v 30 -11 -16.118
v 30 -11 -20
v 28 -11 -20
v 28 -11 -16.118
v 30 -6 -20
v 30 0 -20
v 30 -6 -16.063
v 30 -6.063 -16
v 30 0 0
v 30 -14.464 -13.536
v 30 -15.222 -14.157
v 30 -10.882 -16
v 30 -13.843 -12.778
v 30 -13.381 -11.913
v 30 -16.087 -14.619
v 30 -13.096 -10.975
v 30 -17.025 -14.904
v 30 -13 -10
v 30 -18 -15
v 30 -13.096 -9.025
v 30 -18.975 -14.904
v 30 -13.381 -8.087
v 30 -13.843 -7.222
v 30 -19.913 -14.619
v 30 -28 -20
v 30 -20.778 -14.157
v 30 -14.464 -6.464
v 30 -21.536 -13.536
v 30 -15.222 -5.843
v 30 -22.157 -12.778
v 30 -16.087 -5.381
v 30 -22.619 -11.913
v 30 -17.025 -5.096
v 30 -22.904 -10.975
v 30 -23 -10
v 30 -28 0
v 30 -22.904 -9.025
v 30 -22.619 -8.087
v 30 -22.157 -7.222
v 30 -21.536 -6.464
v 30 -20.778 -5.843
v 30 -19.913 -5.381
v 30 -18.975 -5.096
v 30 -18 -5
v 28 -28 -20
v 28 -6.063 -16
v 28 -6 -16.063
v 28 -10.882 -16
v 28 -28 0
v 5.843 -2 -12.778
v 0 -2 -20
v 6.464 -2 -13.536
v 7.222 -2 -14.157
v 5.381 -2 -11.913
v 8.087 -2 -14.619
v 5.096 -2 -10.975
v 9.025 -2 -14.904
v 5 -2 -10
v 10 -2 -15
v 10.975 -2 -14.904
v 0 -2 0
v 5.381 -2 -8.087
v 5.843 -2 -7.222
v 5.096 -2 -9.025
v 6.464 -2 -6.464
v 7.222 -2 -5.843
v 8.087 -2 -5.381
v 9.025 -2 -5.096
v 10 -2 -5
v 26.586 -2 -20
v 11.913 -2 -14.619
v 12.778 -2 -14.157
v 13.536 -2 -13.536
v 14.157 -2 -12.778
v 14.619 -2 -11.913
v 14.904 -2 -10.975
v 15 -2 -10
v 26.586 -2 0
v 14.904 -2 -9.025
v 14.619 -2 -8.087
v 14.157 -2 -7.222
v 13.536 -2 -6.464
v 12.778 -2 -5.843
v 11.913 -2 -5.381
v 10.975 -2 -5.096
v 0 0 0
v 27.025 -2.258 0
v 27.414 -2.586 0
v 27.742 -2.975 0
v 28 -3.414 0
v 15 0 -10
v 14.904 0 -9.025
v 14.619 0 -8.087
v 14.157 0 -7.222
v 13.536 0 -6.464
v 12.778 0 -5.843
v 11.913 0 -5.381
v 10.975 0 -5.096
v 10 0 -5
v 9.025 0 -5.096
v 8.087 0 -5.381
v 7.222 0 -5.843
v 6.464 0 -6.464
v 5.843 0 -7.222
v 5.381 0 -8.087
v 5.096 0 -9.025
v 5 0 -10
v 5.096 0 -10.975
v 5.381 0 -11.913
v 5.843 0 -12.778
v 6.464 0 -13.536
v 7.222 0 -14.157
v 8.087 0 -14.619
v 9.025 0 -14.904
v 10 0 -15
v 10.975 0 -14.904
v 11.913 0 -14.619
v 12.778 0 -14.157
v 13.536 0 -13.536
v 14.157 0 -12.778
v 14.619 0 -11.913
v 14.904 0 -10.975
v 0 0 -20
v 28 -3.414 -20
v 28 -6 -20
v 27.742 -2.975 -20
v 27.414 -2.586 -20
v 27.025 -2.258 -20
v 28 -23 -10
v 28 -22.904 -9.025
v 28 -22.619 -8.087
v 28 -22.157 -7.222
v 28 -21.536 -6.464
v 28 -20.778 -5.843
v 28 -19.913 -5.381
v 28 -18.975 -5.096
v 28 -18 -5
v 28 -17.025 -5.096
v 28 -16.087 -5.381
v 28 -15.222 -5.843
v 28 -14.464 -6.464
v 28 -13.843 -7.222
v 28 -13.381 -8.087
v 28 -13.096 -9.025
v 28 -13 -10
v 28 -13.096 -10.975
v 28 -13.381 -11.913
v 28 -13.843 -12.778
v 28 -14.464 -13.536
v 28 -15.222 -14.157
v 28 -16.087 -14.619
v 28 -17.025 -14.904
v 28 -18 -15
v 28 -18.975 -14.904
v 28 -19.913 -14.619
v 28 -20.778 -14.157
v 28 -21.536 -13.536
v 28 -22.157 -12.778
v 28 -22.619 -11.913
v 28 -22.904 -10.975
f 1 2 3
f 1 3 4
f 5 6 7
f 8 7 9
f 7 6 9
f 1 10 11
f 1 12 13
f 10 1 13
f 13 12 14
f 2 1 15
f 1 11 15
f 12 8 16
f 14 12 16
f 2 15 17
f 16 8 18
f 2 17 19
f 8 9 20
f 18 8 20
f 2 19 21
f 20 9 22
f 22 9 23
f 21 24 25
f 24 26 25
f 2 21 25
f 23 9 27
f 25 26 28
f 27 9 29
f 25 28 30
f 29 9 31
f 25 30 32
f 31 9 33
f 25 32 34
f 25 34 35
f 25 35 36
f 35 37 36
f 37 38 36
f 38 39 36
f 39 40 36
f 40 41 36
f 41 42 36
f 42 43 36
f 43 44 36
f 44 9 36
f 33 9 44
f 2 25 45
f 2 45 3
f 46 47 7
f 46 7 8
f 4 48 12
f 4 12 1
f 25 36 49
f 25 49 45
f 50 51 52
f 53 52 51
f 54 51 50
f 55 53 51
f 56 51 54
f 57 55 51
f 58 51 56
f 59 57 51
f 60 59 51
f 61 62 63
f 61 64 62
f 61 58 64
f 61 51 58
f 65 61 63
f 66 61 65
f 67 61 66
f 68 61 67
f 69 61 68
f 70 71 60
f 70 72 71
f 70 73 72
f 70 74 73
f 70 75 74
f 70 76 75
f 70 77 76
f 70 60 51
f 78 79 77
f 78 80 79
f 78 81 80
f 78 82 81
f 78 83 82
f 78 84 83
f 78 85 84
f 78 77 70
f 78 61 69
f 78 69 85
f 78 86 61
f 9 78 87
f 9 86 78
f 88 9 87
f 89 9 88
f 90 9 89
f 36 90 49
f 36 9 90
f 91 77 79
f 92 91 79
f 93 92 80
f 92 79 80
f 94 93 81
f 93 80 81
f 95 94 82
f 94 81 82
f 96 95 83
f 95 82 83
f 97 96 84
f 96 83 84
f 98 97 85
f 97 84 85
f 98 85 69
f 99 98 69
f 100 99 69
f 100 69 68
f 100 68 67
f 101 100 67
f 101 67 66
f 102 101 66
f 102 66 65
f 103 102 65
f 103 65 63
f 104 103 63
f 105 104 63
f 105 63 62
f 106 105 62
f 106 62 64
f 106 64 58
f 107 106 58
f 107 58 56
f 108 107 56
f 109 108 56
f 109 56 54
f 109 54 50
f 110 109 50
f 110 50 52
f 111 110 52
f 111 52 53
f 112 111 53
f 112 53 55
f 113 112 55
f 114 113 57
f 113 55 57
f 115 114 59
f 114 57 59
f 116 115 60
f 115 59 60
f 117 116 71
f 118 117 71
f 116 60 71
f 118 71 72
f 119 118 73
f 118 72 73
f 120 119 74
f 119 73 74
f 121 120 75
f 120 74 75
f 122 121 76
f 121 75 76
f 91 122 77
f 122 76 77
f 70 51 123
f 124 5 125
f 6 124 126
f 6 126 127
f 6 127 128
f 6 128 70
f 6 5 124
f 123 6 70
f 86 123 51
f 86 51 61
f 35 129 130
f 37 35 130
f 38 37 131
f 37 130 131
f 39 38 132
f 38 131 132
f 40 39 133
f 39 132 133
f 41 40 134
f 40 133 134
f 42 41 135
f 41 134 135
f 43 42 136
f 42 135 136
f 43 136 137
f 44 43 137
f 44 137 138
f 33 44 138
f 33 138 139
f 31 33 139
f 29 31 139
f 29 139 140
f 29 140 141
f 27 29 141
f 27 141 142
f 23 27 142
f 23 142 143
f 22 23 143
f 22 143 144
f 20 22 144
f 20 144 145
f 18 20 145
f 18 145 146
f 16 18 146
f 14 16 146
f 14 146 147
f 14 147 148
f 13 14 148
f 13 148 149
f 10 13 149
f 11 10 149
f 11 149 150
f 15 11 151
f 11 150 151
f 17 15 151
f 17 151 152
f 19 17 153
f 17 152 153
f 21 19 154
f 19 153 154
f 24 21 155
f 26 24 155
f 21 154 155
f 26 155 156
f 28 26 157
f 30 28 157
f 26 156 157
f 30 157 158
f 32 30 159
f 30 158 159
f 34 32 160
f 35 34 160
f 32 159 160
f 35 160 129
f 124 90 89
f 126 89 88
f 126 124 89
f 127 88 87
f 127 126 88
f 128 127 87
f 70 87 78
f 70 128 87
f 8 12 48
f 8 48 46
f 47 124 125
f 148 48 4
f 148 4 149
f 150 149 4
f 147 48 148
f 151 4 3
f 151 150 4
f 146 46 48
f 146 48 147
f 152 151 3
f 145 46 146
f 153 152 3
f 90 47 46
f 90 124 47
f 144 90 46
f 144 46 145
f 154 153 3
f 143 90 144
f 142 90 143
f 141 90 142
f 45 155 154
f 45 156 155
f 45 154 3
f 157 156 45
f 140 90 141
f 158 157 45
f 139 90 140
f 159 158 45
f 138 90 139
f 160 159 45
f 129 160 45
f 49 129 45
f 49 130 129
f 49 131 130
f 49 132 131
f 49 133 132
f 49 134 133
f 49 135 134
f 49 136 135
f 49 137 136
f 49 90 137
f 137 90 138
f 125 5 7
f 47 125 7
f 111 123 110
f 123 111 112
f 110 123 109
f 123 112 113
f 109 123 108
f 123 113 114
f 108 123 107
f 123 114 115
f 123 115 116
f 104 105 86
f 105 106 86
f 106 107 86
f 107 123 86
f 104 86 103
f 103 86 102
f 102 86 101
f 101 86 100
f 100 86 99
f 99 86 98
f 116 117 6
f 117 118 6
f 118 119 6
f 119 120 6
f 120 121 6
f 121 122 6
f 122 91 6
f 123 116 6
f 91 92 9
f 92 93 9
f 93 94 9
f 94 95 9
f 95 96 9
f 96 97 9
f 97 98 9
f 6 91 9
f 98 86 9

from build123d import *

# Parameters (mm, degrees)
F0_W      = 30
F0_H      = 20
F1_DEPTH  = 2
F2_R      = 5
F3_DEPTH  = 25
F4_W      = 5
F4_H      = 4
F5_DEPTH  = 2
F6_W      = 5
F6_H      = 4
F7_DEPTH  = 25
F8_R      = 5
F9_DEPTH  = 25
F11_DEPTH = 20
F13_DEPTH = 2
F15_DEPTH = 2


with BuildPart() as f1:
    # F0 (on Front) → F1 (new body)
    with BuildSketch(Plane.XZ):
        with Locations((15, -10)):
            Rectangle(F0_W, F0_H)
    extrude(amount=F1_DEPTH)

    # F2 (on face) → F3 (cut)
    with BuildSketch(Plane.XZ.offset(2)):
        with Locations((10, -10)):
            Circle(F2_R)
    extrude(amount=-F3_DEPTH, mode=Mode.SUBTRACT)

    # F4 (on face) → F5 (join)
    with BuildSketch(Plane.YZ.offset(30)):
        Polygon((-3, -20), (-2, -20), (-2, 0), (-28, 0), (-28, -20), (-8, -20), (-8, -16), (-3, -16), align=None)
        with Locations((-5.5, -18)):
            Rectangle(F4_W, F4_H)
    extrude(amount=-F5_DEPTH)

    # F6 (on face) → F7 (cut)
    with BuildSketch(Plane.YZ.offset(30)):
        with Locations((-8.5, -18)):
            Rectangle(F6_W, F6_H)
    extrude(amount=-F7_DEPTH, mode=Mode.SUBTRACT)

    # F8 (on face) → F9 (cut)
    with BuildSketch(Plane(origin=(28, 0, 0), x_dir=(0, -1, 0), z_dir=(-1, 0, 0))):
        with Locations((18, -10)):
            Circle(F8_R)
    extrude(amount=-F9_DEPTH, mode=Mode.SUBTRACT)

    # F10 (on face) → F11 (join)
    with BuildSketch(Plane(origin=(0, 0, -20), x_dir=(1, 0, 0), z_dir=(0, 0, -1))):
        with BuildLine():
            ThreePointArc((28, 6), (27.414214, 2.585786), (24, 2))
            Line((24, 2), (24, 0))
            Line((24, 0), (30, 0))
            Line((30, 0), (30, 6))
            Line((30, 6), (28, 6))
        make_face()
    extrude(amount=-F11_DEPTH)

    # F12 (on face) → F13 (join)
    with BuildSketch(Plane(origin=(28, 0, 0), x_dir=(0, -1, 0), z_dir=(-1, 0, 0))):
        Polygon((11, -16), (10.881885, -16), (11, -16.118115), align=None)
    extrude(amount=-F13_DEPTH)

    # F14 (on face) → F15 (join)
    with BuildSketch(Plane(origin=(28, 0, 0), x_dir=(0, -1, 0), z_dir=(-1, 0, 0))):
        Polygon((6.06307, -16), (6, -16), (6, -16.06307), align=None)
    extrude(amount=-F15_DEPTH)


solid = f1.part
